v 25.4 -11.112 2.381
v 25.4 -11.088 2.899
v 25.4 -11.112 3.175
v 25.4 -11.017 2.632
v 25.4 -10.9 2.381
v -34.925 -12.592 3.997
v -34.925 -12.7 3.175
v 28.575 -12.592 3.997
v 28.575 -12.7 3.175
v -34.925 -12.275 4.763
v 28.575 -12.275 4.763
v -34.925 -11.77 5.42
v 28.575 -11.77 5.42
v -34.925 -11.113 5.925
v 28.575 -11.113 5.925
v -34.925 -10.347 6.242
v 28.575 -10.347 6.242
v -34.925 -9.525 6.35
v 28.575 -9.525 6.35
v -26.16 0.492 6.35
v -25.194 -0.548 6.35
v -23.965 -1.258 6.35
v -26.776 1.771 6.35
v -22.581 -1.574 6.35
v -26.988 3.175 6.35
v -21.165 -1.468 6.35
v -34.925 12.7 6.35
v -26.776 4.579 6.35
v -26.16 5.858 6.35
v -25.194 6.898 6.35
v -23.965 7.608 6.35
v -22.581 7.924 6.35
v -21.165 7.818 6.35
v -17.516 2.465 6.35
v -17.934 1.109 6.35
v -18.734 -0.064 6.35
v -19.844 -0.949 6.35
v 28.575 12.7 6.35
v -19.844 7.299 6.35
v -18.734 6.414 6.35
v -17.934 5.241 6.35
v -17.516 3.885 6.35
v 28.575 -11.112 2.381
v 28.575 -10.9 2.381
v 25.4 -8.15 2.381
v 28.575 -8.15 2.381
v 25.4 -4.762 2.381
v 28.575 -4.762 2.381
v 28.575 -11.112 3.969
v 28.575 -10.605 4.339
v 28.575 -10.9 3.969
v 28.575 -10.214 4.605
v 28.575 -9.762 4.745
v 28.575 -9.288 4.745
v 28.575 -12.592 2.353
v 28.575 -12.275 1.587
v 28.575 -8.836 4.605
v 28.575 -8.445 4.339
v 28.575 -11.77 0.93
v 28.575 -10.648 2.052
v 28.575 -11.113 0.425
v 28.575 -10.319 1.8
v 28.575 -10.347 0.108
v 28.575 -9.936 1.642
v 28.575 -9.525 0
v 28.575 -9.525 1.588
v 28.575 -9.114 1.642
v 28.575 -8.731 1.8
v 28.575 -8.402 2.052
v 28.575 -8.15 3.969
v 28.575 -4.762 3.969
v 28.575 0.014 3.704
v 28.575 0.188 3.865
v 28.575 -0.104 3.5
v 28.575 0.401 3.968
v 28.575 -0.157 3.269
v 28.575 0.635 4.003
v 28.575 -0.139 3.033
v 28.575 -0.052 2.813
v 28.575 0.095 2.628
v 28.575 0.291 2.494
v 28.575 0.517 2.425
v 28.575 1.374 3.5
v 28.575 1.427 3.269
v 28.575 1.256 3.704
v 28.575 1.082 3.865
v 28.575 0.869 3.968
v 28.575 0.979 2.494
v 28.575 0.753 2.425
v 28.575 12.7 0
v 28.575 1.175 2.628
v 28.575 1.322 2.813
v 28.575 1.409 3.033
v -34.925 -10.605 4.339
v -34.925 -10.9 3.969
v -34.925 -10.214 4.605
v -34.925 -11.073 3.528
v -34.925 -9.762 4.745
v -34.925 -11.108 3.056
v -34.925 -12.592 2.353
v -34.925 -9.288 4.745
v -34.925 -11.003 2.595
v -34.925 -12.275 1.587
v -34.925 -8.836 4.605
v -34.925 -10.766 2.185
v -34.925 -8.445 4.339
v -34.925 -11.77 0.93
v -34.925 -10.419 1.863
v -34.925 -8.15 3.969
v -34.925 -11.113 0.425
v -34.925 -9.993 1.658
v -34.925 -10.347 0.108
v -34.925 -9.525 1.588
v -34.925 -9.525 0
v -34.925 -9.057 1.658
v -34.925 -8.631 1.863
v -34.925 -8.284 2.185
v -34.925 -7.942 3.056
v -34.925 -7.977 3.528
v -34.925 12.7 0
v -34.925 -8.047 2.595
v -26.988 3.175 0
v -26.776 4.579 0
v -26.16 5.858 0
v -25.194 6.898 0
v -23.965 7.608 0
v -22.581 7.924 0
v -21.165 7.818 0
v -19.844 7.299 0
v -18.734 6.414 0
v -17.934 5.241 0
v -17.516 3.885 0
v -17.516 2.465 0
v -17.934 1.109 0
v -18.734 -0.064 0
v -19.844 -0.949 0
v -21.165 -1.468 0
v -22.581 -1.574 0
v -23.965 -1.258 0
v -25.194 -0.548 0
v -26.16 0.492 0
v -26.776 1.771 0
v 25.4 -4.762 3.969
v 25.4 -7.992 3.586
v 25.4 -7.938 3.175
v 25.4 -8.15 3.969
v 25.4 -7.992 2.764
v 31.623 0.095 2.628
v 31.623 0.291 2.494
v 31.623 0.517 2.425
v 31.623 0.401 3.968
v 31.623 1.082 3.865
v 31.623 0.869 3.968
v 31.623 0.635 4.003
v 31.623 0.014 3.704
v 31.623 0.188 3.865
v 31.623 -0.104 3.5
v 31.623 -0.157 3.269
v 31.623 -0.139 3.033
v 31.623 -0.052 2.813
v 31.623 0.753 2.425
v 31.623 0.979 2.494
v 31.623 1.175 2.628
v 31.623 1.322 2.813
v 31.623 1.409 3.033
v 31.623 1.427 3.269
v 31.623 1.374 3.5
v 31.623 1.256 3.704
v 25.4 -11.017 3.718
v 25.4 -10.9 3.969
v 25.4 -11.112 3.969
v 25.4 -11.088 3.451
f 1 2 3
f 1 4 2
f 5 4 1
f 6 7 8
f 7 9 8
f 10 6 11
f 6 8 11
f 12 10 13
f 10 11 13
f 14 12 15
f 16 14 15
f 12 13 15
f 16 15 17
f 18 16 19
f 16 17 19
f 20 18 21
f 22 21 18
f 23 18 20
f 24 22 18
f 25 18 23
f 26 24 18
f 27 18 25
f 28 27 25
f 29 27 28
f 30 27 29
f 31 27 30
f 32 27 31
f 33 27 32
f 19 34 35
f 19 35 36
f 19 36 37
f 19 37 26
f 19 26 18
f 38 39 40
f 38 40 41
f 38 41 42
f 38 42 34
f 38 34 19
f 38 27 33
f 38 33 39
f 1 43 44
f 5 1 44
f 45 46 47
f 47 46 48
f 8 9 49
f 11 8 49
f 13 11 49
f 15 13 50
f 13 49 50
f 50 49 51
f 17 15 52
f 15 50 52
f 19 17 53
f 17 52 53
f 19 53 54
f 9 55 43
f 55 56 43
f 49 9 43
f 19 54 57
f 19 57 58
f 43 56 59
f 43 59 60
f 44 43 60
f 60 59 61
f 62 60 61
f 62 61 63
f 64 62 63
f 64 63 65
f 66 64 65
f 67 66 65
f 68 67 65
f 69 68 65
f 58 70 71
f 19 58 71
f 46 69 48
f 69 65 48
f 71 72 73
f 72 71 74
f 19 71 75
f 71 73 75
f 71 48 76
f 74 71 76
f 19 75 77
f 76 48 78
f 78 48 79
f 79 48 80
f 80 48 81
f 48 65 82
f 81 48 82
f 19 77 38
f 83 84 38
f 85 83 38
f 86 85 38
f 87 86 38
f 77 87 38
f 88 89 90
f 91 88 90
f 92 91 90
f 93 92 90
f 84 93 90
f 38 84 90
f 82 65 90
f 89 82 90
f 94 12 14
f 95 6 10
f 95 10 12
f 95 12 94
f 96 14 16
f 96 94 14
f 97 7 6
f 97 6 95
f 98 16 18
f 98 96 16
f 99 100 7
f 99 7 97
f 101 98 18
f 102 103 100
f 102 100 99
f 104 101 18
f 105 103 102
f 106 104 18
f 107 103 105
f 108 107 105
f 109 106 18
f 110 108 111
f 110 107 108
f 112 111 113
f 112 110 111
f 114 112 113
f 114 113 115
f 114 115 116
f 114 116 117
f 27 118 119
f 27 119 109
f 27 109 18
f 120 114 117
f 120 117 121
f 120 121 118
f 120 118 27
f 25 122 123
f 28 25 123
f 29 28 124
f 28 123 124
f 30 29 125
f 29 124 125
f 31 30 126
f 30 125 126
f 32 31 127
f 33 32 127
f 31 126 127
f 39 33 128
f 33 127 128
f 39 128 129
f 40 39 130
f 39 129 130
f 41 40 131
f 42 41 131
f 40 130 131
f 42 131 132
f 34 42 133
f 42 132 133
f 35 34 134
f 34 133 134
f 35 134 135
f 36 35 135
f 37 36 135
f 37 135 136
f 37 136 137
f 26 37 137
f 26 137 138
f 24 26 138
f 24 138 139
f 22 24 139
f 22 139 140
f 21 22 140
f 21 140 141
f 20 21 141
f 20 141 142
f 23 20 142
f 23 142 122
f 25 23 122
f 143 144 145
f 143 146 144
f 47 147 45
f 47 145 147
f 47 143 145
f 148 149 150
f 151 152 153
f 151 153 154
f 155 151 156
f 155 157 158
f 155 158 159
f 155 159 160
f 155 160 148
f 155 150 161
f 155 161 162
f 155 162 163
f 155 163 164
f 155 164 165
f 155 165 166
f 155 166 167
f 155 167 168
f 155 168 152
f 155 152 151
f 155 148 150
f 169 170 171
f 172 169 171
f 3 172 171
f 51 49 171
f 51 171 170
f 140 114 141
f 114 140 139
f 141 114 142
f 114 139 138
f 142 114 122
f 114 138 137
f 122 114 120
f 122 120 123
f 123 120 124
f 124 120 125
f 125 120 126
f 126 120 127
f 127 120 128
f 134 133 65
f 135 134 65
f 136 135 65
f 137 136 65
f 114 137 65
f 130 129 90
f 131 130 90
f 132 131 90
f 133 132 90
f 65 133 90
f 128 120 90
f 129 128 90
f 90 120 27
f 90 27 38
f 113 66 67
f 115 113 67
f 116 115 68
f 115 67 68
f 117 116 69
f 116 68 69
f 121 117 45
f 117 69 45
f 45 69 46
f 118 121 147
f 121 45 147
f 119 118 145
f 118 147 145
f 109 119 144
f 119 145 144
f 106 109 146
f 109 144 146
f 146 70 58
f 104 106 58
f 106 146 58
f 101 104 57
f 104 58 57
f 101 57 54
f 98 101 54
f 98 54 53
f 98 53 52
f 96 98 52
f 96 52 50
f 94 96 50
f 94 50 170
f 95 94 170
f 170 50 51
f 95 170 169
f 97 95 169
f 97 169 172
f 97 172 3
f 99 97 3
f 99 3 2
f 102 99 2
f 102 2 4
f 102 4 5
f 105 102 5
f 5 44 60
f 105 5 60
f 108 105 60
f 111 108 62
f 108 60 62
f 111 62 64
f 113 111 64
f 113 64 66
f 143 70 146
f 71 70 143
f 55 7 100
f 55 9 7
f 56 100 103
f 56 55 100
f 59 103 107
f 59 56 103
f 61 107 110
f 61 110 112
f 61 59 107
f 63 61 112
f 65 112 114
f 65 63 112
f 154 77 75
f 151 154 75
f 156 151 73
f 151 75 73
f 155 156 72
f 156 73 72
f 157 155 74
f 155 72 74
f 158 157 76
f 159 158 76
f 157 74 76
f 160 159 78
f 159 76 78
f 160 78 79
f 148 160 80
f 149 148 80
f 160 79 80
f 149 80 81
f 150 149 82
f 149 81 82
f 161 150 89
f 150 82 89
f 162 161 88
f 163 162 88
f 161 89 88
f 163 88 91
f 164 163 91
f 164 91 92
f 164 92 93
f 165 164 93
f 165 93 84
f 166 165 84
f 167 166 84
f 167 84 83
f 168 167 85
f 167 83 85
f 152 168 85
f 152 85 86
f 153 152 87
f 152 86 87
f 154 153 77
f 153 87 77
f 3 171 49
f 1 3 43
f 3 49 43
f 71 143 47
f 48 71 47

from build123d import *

# Parameters (mm, degrees)
SKETCH1_W           = 63.5
SKETCH1_H           = 25.4
BOSS_EXTRUDE1_DEPTH = 6.35
SKETCH3_R           = 1.5875
CUT_EXTRUDE2_DEPTH  = 66.068137364
FILLET1_R           = 3.175
SKETCH4_R           = 4.7625
CUT_EXTRUDE3_DEPTH  = 38.701036126
SKETCH5_W           = 1.5875
SKETCH5_H           = 6.35
CUT_EXTRUDE4_DEPTH  = 3.175
SKETCH6_R           = 0.79375
BOSS_EXTRUDE2_DEPTH = 3.048


with BuildPart() as part:
    # Sketch1 → Boss-Extrude1 (new body)
    with BuildSketch(Plane.XY):
        with Locations((-3.175, 0)):
            Rectangle(SKETCH1_W, SKETCH1_H)
    extrude(amount=BOSS_EXTRUDE1_DEPTH)

    # Sketch3 → Cut-Extrude2 (cut, through all)
    with BuildSketch(Plane(origin=(28.575, 0, 6.35), x_dir=(0, 0, -1), z_dir=(1, 0, 0))):
        with Locations((3.175, -9.525)):
            Circle(SKETCH3_R)
    extrude(amount=-CUT_EXTRUDE2_DEPTH, mode=Mode.SUBTRACT)

    # Fillet1
    fillet1_edges = [part.edges().sort_by_distance(p)[0] for p in [
        (-3.175, -12.7, 0),
        (-3.175, -12.7, 6.35),
    ]]
    fillet(fillet1_edges, radius=FILLET1_R - 0.0001)  # a hair under: the kernel refuses the full size

    # Sketch4 → Cut-Extrude3 (cut, through all)
    with BuildSketch(Plane(origin=(0, 0, 0), x_dir=(-1, 0, 0), z_dir=(0, 0, -1))):
        with Locations((22.225, 3.175)):
            Circle(SKETCH4_R)
    extrude(amount=-CUT_EXTRUDE3_DEPTH, mode=Mode.SUBTRACT)

    # Sketch5 → Cut-Extrude4 (cut)
    with BuildSketch(Plane(origin=(28.575, 0, 0), x_dir=(0, 0, -1), z_dir=(1, 0, 0))):
        with Locations((-3.175, -7.9375)):
            Rectangle(SKETCH5_W, SKETCH5_H)
    extrude(amount=-CUT_EXTRUDE4_DEPTH, mode=Mode.SUBTRACT)

    # Sketch6 → Boss-Extrude2 (add)
    with BuildSketch(Plane(origin=(28.575, 0, 0), x_dir=(0, 0, -1), z_dir=(1, 0, 0))):
        with Locations(Location((-3.209540098, 0.635, 0), (0, 0, 180))):
            Circle(SKETCH6_R)
    extrude(amount=BOSS_EXTRUDE2_DEPTH)


solid = part.part
